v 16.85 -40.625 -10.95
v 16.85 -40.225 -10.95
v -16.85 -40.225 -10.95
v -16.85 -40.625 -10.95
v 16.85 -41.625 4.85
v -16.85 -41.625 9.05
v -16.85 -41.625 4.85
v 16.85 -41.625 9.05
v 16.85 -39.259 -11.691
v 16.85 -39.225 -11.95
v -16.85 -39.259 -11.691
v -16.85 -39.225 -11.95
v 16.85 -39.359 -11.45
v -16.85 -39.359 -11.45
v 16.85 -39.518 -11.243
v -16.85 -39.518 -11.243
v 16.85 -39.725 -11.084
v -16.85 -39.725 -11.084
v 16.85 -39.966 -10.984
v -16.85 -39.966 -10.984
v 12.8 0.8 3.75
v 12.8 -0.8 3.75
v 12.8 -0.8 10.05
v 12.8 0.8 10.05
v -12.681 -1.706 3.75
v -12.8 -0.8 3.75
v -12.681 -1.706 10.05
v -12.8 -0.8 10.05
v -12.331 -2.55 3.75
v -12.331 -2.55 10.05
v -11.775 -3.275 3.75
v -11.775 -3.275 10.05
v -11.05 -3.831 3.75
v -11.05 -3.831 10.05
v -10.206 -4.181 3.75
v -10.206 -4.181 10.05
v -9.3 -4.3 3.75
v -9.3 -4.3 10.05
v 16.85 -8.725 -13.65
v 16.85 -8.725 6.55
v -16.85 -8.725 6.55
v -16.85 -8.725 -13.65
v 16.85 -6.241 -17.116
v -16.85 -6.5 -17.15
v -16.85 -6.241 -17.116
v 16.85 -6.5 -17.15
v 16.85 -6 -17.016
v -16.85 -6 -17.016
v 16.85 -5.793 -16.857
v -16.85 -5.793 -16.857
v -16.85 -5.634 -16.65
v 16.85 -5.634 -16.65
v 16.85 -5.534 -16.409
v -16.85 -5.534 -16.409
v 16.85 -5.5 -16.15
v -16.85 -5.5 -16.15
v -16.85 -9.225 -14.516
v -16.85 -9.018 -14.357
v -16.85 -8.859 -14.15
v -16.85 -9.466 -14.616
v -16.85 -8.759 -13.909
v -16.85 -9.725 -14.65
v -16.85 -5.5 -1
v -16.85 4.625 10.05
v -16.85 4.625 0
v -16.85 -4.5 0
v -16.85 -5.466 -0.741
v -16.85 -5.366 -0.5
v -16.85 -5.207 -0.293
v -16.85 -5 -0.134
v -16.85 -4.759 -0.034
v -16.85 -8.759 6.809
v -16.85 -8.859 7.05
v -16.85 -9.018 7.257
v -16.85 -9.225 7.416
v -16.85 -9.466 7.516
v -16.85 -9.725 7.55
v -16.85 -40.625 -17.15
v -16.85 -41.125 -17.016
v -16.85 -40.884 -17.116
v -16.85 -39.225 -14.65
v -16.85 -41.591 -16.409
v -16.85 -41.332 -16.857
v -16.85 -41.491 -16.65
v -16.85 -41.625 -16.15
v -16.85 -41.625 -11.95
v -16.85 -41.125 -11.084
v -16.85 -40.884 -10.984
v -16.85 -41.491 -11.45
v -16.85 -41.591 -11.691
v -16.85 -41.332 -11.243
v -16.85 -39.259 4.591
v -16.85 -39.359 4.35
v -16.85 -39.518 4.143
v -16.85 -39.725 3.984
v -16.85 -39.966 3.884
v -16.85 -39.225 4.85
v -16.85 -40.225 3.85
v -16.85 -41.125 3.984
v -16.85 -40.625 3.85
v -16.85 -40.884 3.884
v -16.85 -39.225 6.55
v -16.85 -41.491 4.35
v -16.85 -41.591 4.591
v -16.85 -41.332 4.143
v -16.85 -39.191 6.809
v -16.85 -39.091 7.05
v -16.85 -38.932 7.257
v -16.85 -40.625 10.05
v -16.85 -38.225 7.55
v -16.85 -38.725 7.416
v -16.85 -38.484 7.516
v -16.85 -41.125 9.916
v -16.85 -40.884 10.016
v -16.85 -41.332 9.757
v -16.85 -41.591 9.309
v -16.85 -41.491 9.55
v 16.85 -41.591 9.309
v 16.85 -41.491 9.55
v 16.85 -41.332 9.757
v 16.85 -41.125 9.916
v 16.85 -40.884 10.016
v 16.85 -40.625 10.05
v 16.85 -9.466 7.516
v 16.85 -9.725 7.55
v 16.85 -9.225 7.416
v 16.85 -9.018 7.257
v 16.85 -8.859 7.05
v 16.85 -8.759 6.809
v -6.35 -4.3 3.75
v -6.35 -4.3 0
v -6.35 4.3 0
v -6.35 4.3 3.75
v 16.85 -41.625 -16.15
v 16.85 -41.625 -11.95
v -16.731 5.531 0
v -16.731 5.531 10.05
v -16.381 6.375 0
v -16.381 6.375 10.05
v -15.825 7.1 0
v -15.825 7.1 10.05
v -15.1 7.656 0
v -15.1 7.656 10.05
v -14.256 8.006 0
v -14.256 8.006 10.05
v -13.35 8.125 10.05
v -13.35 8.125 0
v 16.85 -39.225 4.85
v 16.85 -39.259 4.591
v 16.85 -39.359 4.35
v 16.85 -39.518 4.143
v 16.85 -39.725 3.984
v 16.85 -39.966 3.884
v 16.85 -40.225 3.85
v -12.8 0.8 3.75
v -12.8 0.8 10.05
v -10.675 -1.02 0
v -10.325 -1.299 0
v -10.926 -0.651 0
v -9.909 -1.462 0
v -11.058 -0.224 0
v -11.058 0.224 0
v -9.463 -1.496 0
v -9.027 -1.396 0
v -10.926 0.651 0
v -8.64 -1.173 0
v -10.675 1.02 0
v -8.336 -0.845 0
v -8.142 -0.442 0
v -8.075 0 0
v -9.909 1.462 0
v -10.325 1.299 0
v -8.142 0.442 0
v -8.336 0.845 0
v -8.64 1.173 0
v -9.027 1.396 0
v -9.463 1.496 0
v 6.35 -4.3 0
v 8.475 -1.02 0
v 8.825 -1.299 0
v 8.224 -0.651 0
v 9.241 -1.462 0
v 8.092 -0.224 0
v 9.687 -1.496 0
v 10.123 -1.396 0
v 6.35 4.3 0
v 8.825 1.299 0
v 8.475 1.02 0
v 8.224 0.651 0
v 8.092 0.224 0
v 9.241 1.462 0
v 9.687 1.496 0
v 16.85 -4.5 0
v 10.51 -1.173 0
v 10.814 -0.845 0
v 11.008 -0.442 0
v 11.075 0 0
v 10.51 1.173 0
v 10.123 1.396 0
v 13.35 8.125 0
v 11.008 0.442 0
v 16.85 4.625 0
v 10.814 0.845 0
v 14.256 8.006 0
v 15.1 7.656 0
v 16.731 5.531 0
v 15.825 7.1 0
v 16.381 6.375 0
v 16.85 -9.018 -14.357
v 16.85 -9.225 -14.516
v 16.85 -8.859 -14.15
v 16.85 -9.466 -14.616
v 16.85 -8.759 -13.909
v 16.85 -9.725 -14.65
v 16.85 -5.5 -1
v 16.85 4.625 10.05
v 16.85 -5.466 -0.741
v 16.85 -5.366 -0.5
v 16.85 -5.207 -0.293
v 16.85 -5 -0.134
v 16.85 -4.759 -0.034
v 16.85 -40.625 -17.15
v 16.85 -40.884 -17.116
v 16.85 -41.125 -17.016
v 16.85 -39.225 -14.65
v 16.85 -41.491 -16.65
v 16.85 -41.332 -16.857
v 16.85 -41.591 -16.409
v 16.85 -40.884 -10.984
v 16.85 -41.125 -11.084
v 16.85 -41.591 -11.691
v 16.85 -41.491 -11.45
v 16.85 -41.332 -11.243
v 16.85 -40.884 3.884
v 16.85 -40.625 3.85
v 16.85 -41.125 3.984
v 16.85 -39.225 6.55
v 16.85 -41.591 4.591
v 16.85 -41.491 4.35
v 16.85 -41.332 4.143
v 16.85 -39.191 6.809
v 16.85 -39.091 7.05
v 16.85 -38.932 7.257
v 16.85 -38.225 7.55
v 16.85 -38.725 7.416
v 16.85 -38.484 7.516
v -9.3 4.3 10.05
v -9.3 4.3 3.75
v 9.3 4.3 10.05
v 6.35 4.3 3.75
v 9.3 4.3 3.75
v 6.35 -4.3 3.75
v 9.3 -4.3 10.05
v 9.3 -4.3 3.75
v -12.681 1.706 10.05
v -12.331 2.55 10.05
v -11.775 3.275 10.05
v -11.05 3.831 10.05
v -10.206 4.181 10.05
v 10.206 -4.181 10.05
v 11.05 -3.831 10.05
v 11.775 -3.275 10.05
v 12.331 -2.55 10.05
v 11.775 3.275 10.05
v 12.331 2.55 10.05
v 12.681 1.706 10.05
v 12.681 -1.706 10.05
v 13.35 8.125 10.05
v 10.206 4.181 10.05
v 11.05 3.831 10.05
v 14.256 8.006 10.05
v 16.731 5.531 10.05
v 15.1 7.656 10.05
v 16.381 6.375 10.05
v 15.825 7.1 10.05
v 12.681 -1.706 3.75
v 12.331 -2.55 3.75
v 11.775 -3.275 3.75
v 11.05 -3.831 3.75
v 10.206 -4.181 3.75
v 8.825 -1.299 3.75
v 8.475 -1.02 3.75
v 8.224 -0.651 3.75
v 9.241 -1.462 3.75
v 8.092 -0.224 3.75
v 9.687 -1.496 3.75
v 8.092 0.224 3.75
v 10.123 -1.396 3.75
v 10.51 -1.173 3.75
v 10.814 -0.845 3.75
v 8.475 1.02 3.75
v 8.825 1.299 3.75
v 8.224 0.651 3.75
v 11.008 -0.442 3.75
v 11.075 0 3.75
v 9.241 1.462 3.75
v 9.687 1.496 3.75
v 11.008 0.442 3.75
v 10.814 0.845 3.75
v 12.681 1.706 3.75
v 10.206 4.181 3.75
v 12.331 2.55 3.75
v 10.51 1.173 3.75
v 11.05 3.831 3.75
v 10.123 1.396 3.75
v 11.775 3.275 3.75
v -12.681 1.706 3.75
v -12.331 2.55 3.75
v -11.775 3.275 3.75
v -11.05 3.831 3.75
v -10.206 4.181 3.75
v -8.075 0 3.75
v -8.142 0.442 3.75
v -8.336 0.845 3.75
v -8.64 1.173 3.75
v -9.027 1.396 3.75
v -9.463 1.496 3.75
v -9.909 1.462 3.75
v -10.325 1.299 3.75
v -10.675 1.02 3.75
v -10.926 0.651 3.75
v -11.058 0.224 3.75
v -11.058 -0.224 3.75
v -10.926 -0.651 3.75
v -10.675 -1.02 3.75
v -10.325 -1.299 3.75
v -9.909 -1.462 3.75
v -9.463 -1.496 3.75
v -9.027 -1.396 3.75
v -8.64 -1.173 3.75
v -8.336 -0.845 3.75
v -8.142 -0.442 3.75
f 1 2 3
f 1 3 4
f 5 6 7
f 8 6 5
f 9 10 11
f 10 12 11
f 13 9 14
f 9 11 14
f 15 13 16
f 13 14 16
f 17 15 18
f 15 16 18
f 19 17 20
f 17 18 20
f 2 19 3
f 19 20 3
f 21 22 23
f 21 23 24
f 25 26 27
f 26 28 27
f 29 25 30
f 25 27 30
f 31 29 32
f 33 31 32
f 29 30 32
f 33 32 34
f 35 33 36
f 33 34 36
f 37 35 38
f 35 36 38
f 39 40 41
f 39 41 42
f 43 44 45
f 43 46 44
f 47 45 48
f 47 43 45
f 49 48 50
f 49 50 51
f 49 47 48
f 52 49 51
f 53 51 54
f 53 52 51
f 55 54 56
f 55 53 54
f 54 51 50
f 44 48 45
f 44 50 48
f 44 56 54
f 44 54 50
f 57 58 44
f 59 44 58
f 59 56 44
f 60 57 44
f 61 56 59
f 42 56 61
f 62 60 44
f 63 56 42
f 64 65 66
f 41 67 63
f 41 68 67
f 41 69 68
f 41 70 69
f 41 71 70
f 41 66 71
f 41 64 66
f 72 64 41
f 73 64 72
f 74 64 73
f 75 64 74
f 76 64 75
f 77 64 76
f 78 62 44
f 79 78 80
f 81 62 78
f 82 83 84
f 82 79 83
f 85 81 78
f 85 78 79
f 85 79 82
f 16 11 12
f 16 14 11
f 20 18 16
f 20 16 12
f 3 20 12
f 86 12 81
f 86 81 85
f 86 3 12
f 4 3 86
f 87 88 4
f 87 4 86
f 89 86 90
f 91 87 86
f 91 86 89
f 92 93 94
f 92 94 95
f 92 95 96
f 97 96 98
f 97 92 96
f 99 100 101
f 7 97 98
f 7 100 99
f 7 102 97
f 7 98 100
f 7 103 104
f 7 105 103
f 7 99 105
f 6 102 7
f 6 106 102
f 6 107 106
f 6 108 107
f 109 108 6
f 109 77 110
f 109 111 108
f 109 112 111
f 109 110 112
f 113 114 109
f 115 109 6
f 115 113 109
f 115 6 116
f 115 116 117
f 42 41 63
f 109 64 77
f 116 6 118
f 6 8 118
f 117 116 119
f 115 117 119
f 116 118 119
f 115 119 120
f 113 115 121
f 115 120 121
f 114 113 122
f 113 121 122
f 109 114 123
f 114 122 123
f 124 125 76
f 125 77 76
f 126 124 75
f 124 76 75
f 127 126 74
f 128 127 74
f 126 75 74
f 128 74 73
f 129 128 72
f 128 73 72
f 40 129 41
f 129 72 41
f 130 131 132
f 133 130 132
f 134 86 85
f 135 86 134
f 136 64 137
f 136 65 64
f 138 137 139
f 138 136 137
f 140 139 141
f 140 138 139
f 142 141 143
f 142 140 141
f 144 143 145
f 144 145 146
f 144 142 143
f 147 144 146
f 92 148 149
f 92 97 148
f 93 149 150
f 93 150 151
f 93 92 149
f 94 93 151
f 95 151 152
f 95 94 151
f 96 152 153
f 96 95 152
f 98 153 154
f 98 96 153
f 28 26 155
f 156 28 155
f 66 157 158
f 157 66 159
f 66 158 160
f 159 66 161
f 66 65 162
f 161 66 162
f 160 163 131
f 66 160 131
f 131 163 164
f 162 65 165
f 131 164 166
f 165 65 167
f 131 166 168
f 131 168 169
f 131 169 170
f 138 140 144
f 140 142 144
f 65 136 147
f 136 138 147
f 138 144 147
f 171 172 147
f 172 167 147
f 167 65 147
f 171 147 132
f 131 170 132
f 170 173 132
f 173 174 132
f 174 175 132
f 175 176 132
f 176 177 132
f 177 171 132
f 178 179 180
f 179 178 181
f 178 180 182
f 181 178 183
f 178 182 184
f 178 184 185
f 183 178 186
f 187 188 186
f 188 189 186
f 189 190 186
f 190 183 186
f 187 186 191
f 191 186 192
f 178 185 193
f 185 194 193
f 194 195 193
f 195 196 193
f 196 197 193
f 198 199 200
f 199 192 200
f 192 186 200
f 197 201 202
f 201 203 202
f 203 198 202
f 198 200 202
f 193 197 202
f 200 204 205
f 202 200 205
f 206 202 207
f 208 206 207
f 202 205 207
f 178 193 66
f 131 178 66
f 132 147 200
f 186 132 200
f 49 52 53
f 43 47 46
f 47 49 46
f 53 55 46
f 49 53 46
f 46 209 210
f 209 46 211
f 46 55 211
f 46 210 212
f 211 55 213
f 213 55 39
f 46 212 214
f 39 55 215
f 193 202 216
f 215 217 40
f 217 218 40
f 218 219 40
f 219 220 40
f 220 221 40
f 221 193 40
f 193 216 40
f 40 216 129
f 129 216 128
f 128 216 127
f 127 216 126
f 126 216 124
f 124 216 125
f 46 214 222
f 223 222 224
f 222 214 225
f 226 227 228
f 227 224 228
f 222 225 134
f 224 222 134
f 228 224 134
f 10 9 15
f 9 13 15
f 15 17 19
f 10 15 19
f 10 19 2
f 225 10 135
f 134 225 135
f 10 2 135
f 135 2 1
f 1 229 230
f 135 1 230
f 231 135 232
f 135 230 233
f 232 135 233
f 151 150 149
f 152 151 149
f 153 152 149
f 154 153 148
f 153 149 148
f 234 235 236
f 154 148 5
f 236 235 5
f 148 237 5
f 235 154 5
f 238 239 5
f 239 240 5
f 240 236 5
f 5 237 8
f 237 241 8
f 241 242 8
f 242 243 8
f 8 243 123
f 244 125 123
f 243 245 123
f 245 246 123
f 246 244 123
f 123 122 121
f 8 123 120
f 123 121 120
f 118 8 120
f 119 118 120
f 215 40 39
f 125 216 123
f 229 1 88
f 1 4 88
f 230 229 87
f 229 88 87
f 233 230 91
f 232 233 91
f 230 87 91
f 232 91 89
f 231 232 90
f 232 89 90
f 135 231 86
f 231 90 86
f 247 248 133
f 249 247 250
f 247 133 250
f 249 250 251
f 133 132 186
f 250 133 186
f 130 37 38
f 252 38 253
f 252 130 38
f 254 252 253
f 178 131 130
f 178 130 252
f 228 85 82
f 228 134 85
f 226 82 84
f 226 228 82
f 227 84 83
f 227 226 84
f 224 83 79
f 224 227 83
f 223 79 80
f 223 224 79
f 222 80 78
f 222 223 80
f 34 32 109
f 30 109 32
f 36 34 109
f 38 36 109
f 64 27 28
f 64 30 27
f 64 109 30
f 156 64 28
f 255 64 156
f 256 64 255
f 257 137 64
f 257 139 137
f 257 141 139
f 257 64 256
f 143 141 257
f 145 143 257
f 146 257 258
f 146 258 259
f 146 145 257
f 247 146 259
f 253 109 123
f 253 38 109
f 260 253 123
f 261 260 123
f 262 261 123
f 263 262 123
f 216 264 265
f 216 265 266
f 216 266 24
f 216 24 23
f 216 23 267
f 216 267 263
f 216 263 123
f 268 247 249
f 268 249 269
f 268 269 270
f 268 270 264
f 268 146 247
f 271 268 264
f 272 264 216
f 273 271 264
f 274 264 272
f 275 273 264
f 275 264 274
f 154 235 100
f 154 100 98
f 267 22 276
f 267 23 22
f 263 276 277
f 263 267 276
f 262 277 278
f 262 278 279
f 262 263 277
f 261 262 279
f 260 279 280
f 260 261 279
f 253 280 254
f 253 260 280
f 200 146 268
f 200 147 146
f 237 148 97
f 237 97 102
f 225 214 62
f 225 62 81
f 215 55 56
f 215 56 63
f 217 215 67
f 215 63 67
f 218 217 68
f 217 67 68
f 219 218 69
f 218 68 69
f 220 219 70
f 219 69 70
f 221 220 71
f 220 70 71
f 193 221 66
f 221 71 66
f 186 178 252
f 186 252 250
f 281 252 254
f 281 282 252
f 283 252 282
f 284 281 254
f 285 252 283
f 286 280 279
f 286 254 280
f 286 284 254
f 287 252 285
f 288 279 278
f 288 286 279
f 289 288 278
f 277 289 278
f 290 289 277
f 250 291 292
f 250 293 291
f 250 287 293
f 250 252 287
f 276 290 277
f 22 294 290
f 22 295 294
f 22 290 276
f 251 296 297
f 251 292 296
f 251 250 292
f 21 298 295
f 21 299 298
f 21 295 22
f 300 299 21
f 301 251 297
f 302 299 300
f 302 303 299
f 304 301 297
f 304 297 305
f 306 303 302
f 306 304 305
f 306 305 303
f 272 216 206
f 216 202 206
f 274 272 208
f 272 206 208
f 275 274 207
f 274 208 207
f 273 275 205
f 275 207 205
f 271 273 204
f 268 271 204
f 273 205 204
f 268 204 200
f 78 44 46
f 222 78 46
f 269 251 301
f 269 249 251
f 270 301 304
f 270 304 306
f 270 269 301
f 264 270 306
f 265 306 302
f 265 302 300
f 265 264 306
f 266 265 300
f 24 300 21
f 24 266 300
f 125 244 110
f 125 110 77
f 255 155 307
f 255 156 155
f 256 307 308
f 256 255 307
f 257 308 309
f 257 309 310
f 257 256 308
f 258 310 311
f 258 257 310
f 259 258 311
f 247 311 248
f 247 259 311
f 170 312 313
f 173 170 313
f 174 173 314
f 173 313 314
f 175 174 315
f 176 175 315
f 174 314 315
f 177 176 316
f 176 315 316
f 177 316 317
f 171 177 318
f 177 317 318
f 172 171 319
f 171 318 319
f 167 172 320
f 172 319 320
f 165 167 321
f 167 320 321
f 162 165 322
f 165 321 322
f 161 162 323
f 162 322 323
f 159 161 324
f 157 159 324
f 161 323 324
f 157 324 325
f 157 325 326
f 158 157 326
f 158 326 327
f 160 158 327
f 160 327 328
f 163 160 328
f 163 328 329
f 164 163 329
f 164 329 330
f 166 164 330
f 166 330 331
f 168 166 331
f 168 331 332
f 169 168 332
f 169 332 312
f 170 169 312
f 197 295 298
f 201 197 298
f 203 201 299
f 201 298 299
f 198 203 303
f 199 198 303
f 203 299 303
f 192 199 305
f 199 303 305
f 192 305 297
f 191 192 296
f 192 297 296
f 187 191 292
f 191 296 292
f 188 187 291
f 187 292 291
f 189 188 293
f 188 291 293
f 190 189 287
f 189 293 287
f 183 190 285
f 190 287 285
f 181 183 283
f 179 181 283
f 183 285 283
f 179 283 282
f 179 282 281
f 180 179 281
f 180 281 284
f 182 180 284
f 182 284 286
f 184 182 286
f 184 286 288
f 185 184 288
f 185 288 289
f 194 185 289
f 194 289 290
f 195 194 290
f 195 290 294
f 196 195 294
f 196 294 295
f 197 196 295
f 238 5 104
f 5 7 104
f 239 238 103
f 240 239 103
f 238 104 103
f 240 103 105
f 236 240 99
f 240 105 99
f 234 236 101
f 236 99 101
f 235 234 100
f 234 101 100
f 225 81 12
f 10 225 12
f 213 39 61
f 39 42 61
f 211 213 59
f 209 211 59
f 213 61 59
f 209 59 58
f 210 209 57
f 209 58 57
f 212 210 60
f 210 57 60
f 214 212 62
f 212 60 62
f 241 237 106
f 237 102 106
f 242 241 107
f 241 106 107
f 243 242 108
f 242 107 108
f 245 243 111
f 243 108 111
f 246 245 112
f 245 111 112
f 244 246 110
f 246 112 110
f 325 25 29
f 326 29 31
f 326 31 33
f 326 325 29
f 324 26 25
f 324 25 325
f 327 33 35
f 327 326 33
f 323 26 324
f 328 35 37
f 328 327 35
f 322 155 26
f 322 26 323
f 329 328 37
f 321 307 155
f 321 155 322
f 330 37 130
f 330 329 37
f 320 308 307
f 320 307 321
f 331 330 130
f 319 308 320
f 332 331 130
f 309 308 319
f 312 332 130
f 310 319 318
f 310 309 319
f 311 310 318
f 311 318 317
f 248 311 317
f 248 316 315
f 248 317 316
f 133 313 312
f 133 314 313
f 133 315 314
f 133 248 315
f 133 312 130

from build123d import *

# Parameters (mm, degrees)
SKETCH_W        = 33.7
SKETCH_H        = 16.25
SKETCH_W_2      = 12.7
SKETCH_H_2      = 8.6
PAD_DEPTH       = 3.75
SKETCH001_W     = 33.7
SKETCH001_H     = 16.25
SKETCH001_W_2   = 25.6
SKETCH001_H_2   = 8.6
PAD001_DEPTH    = 6.3
FILLET_R        = 3.5
SKETCH002_R     = 1.5
POCKET_DEPTH    = 3.751
PAD002_DEPTH    = 27.2
SKETCH004_W     = 0.875
SKETCH004_H     = 17.15
POCKET001_DEPTH = 33.701
FILLET001_R     = 1


with BuildPart() as part:
    # Sketch → Pad (new body)
    with BuildSketch(Plane.XY):
        Rectangle(SKETCH_W, SKETCH_H)
        Rectangle(SKETCH_W_2, SKETCH_H_2, mode=Mode.SUBTRACT)
    extrude(amount=PAD_DEPTH)

    # Sketch001 (on Face10 of Pad) → Pad001 (join)
    with BuildSketch(Plane.XY.offset(3.75)):
        Rectangle(SKETCH001_W, SKETCH001_H)
        Rectangle(SKETCH001_W_2, SKETCH001_H_2, mode=Mode.SUBTRACT)
    extrude(amount=PAD001_DEPTH)

    # Fillet
    fillet_edges = [part.edges().sort_by_distance(p)[0] for p in [
        (-12.8, 4.3, 6.9),
        (12.8, 4.3, 6.9),
        (12.8, -4.3, 6.9),
        (-12.8, -4.3, 6.9),
        (-16.85, -8.125, 5.025),
        (-16.85, 8.125, 5.025),
        (16.85, -8.125, 5.025),
        (16.85, 8.125, 5.025),
    ]]
    fillet(fillet_edges, radius=FILLET_R)

    # Sketch002 (on Face18 of Fillet) → Pocket (cut, through all)
    with BuildSketch(Plane.XY.offset(3.75)):
        with Locations((-9.575, 0)):
            Circle(SKETCH002_R)
        with Locations((9.575, 0)):
            Circle(SKETCH002_R)
    extrude(amount=-POCKET_DEPTH, mode=Mode.SUBTRACT)

    # Sketch003 (on Face16 of Pocket) → Pad002 (join)
    with BuildSketch(Plane.XY.offset(10.05)):
        with BuildLine():
            Line((-16.85, -41.625), (16.85, -41.625))
            Line((16.85, -5.5), (16.85, -41.625))
            Line((16.85, -4.625), (16.85, -5.5))
            ThreePointArc((16.73886, -5.5), (16.822104, -5.066015), (16.85, -4.625))
            Line((16.73886, -5.5), (-16.73886, -5.5))
            ThreePointArc((-16.85, -4.625), (-16.822104, -5.066015), (-16.73886, -5.5))
            Line((-16.85, -4.625), (-16.85, -5.5))
            Line((-16.85, -5.5), (-16.85, -41.625))
        make_face()
    extrude(amount=-PAD002_DEPTH)

    # Sketch004 (on Face26 of Pad002) → Pocket001 (cut, through all)
    with BuildSketch(Plane.YZ.offset(16.85)):
        Polygon((-41.625, 3.85), (-39.225, 3.85), (-39.225, 7.55), (-8.725, 7.55), (-8.725, -14.65), (-39.225, -14.65), (-39.225, -10.95), (-41.625, -10.95), align=None)
        with Locations((-5.0625, -8.575)):
            Rectangle(SKETCH004_W, SKETCH004_H)
    extrude(amount=-POCKET001_DEPTH, mode=Mode.SUBTRACT)

    # Fillet001
    fillet001_edges = [part.edges().sort_by_distance(p)[0] for p in [
        (0, -8.725, 7.55),
        (0, -39.225, 7.55),
        (0, -5.5, -17.15),
        (0, -8.725, -14.65),
        (0, -41.625, 10.05),
        (0, -41.625, -17.15),
        (0, -41.625, -10.95),
        (0, -41.625, 3.85),
        (0, -39.225, 3.85),
        (0, -39.225, -10.95),
        (0, -5.5, 0),
    ]]
    fillet(fillet001_edges, radius=FILLET001_R)


solid = part.part
